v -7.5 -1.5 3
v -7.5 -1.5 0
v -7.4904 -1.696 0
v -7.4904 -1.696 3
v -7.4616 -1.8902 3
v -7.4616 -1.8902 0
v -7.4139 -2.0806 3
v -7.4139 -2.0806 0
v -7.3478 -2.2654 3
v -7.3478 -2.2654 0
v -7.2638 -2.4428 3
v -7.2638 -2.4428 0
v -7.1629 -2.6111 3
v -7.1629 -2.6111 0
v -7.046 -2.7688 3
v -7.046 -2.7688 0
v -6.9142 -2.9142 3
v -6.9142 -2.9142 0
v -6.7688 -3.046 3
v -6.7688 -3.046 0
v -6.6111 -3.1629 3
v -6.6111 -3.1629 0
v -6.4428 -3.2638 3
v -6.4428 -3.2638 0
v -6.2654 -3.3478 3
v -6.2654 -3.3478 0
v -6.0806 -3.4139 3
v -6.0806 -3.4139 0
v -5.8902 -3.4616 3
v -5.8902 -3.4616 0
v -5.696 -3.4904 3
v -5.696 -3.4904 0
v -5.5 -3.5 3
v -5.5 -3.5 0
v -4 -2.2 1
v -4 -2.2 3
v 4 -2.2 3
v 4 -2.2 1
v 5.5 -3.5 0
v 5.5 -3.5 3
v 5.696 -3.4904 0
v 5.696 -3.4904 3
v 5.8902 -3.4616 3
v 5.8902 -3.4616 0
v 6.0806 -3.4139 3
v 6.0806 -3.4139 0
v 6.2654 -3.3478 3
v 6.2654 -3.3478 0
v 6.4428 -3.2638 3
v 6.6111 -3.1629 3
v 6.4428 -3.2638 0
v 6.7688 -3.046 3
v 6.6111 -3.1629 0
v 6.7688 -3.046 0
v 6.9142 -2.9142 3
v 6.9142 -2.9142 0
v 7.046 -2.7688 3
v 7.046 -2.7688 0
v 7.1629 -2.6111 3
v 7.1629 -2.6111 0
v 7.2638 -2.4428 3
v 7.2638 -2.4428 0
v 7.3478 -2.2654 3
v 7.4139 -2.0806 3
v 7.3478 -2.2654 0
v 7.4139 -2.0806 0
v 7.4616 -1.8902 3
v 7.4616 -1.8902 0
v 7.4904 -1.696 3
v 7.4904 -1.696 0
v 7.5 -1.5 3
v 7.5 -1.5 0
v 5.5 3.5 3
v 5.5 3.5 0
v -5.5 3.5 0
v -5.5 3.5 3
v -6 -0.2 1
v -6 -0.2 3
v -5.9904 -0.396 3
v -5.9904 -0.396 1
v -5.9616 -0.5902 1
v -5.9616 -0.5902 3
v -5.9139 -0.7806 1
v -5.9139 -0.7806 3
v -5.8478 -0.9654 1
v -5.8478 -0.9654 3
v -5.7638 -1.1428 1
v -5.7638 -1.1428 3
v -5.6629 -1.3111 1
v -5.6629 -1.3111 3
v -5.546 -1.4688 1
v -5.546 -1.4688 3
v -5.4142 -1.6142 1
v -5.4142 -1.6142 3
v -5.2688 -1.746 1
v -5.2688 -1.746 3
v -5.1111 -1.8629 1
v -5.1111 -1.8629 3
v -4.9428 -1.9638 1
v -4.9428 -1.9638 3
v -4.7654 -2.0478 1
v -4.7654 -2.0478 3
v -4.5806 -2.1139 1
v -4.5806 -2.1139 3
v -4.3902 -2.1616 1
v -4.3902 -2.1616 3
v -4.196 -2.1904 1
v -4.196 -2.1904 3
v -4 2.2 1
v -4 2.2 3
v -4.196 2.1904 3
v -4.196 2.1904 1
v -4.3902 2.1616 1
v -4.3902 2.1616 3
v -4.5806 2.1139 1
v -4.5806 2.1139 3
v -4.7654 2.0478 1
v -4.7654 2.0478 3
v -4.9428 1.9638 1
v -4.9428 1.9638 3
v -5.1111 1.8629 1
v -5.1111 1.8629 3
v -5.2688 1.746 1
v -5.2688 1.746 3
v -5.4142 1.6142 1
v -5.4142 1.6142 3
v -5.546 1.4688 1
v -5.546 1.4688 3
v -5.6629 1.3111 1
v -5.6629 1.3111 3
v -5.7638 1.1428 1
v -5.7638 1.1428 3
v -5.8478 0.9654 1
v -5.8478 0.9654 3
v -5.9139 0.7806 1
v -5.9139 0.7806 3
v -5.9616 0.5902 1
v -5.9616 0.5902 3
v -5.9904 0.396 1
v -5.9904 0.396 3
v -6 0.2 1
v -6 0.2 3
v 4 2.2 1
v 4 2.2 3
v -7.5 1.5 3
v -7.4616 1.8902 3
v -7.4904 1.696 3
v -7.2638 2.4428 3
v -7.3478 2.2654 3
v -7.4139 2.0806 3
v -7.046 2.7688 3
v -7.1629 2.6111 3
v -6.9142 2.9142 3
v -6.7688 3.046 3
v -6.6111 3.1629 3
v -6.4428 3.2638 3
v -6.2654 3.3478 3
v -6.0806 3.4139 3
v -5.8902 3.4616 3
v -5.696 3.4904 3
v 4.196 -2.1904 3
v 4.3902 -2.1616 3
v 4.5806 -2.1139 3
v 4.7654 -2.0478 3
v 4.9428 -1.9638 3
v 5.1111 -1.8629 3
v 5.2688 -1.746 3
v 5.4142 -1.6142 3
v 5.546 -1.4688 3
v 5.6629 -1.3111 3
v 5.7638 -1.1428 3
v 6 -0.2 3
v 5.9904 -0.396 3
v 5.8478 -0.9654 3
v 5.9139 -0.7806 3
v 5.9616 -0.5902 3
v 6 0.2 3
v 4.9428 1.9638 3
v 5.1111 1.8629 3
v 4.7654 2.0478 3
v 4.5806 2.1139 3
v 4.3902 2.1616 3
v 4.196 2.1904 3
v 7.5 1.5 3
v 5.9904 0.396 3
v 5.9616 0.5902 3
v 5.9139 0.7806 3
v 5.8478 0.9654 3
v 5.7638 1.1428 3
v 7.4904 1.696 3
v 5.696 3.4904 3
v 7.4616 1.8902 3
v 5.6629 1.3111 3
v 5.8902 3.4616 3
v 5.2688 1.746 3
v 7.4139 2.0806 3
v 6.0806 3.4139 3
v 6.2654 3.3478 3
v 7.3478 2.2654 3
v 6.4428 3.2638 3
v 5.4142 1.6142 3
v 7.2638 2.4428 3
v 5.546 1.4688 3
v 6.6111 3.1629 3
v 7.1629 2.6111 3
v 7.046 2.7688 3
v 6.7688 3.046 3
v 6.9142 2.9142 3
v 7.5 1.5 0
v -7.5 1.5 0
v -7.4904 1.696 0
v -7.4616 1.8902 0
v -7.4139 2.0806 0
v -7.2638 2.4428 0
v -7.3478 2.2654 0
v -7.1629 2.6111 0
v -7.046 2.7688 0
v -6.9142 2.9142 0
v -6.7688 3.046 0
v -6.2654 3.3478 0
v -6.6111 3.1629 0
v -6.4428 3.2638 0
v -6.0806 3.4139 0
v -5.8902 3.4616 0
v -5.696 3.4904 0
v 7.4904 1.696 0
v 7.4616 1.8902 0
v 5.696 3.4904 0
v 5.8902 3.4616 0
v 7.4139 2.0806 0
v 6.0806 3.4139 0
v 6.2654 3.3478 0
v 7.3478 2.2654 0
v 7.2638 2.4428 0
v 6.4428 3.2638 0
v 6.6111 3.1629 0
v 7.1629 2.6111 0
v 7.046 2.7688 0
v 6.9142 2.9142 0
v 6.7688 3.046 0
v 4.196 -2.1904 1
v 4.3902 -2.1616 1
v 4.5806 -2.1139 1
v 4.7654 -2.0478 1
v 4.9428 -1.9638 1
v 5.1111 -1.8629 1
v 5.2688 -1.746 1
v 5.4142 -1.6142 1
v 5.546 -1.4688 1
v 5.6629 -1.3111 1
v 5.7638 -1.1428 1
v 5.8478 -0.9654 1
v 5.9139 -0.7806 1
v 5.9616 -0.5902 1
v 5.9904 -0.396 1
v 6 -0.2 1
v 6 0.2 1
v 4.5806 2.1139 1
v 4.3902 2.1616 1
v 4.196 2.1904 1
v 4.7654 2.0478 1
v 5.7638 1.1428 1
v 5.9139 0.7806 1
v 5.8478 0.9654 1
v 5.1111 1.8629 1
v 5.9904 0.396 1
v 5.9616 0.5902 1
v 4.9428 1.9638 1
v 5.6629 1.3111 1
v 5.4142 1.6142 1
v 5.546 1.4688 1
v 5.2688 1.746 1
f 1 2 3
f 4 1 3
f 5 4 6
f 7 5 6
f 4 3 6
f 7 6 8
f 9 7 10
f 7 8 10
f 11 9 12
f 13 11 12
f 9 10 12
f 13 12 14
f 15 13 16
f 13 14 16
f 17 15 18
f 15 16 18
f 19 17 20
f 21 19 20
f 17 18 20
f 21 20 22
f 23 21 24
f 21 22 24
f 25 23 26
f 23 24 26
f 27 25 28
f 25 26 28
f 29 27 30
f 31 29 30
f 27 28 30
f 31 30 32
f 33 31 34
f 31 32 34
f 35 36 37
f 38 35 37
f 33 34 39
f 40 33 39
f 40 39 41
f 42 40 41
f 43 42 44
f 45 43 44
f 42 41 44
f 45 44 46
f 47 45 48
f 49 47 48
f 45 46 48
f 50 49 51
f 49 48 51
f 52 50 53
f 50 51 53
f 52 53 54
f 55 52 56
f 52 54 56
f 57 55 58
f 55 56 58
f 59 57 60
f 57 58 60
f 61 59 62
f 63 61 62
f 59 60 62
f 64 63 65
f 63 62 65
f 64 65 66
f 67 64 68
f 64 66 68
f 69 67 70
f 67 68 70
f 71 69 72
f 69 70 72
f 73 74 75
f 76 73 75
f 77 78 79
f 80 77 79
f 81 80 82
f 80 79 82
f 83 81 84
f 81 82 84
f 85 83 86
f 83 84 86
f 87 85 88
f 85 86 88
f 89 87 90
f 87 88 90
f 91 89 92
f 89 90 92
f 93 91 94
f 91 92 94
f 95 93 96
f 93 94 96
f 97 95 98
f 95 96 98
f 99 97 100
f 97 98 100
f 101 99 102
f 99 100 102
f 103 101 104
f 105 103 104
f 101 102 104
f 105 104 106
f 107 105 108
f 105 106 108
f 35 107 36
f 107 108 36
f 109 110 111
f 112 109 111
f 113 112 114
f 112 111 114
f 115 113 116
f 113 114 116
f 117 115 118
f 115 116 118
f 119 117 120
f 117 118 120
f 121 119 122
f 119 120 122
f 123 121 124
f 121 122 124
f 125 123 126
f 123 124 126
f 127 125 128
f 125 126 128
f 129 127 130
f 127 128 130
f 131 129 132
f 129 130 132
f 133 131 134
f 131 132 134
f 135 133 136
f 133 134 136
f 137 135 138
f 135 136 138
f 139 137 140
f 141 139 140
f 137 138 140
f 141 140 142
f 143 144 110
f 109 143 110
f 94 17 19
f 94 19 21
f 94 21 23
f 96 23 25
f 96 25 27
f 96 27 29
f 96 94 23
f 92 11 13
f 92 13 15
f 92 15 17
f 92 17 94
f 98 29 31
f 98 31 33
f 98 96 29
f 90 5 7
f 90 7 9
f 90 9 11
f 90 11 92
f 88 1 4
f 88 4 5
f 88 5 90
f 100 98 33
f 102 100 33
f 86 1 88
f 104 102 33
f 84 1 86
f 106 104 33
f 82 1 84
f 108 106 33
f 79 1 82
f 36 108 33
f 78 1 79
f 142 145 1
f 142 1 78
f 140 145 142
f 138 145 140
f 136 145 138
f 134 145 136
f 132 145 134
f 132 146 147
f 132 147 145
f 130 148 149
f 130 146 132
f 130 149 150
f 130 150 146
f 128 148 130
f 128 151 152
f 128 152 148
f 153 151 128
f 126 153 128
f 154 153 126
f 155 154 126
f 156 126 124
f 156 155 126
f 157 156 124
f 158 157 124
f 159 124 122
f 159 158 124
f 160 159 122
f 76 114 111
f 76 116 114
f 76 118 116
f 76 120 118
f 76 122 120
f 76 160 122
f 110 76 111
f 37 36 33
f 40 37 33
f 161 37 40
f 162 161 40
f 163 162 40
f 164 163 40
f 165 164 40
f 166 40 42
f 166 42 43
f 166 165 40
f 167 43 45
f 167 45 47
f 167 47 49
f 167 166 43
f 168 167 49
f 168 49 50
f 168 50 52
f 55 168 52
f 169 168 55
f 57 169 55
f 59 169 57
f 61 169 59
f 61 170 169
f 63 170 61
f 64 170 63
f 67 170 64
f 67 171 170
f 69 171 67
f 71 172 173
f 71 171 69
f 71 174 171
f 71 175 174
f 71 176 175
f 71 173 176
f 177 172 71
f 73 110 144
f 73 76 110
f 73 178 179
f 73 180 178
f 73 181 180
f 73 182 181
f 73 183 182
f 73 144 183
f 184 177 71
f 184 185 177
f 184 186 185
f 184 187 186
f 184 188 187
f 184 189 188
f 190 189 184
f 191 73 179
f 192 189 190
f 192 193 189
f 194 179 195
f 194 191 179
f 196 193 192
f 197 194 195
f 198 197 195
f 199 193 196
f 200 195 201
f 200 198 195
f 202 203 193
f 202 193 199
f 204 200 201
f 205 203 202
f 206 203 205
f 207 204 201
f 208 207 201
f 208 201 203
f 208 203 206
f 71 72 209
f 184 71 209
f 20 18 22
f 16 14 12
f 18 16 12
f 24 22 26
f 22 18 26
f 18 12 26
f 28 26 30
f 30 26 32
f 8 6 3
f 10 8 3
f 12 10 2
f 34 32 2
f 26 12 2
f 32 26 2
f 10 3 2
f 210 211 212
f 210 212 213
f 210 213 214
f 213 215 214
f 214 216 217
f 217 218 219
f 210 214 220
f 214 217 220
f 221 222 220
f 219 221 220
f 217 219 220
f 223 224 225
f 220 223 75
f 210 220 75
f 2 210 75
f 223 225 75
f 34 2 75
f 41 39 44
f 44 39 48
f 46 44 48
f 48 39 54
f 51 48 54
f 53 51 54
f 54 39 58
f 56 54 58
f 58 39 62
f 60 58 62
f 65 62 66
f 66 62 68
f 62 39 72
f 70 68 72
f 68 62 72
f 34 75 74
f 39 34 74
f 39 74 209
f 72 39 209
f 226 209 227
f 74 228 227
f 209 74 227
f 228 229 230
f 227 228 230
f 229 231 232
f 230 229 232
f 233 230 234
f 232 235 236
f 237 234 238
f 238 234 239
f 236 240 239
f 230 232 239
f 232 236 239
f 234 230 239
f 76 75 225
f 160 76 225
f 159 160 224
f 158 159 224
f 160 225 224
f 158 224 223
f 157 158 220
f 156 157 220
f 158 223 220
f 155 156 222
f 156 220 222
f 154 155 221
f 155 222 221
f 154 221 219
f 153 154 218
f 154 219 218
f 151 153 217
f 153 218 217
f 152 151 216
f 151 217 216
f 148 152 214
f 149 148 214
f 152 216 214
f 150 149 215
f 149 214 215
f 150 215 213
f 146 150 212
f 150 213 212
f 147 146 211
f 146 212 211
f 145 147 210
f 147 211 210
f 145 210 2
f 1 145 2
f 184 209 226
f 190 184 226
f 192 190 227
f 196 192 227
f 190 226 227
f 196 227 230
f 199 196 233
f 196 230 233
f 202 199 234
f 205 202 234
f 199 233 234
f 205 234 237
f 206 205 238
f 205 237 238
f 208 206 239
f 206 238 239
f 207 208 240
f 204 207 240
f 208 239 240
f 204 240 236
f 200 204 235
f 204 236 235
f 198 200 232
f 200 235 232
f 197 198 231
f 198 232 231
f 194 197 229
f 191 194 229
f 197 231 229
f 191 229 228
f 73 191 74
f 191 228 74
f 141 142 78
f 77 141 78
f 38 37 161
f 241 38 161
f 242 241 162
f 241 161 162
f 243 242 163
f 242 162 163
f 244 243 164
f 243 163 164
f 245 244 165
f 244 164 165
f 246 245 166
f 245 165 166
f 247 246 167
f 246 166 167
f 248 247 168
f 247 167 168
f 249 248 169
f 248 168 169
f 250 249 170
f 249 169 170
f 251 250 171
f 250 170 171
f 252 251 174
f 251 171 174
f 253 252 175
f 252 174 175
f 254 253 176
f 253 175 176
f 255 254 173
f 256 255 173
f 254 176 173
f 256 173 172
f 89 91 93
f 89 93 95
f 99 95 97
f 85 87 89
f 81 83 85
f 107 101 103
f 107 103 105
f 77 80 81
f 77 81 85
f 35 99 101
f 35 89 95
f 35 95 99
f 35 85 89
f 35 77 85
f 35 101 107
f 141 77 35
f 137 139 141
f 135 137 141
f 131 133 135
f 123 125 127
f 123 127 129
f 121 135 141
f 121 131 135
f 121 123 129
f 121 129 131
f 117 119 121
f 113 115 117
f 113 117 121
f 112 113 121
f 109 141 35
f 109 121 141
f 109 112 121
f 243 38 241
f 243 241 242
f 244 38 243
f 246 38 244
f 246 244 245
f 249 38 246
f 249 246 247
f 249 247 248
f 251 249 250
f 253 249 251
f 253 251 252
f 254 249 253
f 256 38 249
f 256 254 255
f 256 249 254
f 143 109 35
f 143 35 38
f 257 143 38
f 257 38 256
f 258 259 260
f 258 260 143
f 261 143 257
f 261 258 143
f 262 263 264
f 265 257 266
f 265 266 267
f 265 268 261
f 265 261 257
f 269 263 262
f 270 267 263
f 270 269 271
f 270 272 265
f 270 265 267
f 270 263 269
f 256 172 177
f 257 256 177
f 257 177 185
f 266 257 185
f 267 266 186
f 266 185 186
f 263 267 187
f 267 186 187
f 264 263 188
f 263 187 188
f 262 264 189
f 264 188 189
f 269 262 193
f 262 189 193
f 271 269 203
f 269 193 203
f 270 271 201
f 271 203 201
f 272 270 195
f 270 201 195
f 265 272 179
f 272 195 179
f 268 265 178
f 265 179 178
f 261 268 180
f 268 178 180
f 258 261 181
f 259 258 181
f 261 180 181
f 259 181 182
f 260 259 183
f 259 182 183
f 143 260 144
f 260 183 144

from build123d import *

# Parameters (mm, degrees)
F1_DEPTH = 3
F3_DEPTH = 2
F4_DEPTH = 2


with BuildPart() as f1:
    # F0 (on Top) → F1 (new body)
    with BuildSketch(Plane.XY):
        with BuildLine():
            ThreePointArc((7.5, 1.5), (6.914214, 2.914214), (5.5, 3.5))
            Line((5.5, 3.5), (-5.5, 3.5))
            ThreePointArc((-5.5, 3.5), (-6.914214, 2.914214), (-7.5, 1.5))
            Line((-7.5, 1.5), (-7.5, -1.5))
            ThreePointArc((-7.5, -1.5), (-6.914214, -2.914214), (-5.5, -3.5))
            Line((-5.5, -3.5), (5.5, -3.5))
            ThreePointArc((5.5, -3.5), (6.914214, -2.914214), (7.5, -1.5))
            Line((7.5, -1.5), (7.5, 1.5))
        make_face()
    extrude(amount=F1_DEPTH)

    # F2 (on face) → F3 (join)
    with BuildSketch(Plane.XY.offset(3)):
        with BuildLine():
            ThreePointArc((6, 0.2), (5.414214, 1.614214), (4, 2.2))
            Line((4, 2.2), (-4, 2.2))
            ThreePointArc((-4, 2.2), (-5.414214, 1.614214), (-6, 0.2))
            Line((-6, 0.2), (-6, -0.2))
            ThreePointArc((-6, -0.2), (-5.414214, -1.614214), (-4, -2.2))
            Line((-4, -2.2), (4, -2.2))
            ThreePointArc((4, -2.2), (5.414214, -1.614214), (6, -0.2))
            Line((6, -0.2), (6, 0.2))
        make_face()
    extrude(amount=-F3_DEPTH)

    # F2 (on face) → F4 (cut)
    with BuildSketch(Plane.XY.offset(3)):
        with BuildLine():
            ThreePointArc((6, 0.2), (5.414214, 1.614214), (4, 2.2))
            Line((4, 2.2), (-4, 2.2))
            ThreePointArc((-4, 2.2), (-5.414214, 1.614214), (-6, 0.2))
            Line((-6, 0.2), (-6, -0.2))
            ThreePointArc((-6, -0.2), (-5.414214, -1.614214), (-4, -2.2))
            Line((-4, -2.2), (4, -2.2))
            ThreePointArc((4, -2.2), (5.414214, -1.614214), (6, -0.2))
            Line((6, -0.2), (6, 0.2))
        make_face()
    extrude(amount=-F4_DEPTH, mode=Mode.SUBTRACT)


solid = f1.part
